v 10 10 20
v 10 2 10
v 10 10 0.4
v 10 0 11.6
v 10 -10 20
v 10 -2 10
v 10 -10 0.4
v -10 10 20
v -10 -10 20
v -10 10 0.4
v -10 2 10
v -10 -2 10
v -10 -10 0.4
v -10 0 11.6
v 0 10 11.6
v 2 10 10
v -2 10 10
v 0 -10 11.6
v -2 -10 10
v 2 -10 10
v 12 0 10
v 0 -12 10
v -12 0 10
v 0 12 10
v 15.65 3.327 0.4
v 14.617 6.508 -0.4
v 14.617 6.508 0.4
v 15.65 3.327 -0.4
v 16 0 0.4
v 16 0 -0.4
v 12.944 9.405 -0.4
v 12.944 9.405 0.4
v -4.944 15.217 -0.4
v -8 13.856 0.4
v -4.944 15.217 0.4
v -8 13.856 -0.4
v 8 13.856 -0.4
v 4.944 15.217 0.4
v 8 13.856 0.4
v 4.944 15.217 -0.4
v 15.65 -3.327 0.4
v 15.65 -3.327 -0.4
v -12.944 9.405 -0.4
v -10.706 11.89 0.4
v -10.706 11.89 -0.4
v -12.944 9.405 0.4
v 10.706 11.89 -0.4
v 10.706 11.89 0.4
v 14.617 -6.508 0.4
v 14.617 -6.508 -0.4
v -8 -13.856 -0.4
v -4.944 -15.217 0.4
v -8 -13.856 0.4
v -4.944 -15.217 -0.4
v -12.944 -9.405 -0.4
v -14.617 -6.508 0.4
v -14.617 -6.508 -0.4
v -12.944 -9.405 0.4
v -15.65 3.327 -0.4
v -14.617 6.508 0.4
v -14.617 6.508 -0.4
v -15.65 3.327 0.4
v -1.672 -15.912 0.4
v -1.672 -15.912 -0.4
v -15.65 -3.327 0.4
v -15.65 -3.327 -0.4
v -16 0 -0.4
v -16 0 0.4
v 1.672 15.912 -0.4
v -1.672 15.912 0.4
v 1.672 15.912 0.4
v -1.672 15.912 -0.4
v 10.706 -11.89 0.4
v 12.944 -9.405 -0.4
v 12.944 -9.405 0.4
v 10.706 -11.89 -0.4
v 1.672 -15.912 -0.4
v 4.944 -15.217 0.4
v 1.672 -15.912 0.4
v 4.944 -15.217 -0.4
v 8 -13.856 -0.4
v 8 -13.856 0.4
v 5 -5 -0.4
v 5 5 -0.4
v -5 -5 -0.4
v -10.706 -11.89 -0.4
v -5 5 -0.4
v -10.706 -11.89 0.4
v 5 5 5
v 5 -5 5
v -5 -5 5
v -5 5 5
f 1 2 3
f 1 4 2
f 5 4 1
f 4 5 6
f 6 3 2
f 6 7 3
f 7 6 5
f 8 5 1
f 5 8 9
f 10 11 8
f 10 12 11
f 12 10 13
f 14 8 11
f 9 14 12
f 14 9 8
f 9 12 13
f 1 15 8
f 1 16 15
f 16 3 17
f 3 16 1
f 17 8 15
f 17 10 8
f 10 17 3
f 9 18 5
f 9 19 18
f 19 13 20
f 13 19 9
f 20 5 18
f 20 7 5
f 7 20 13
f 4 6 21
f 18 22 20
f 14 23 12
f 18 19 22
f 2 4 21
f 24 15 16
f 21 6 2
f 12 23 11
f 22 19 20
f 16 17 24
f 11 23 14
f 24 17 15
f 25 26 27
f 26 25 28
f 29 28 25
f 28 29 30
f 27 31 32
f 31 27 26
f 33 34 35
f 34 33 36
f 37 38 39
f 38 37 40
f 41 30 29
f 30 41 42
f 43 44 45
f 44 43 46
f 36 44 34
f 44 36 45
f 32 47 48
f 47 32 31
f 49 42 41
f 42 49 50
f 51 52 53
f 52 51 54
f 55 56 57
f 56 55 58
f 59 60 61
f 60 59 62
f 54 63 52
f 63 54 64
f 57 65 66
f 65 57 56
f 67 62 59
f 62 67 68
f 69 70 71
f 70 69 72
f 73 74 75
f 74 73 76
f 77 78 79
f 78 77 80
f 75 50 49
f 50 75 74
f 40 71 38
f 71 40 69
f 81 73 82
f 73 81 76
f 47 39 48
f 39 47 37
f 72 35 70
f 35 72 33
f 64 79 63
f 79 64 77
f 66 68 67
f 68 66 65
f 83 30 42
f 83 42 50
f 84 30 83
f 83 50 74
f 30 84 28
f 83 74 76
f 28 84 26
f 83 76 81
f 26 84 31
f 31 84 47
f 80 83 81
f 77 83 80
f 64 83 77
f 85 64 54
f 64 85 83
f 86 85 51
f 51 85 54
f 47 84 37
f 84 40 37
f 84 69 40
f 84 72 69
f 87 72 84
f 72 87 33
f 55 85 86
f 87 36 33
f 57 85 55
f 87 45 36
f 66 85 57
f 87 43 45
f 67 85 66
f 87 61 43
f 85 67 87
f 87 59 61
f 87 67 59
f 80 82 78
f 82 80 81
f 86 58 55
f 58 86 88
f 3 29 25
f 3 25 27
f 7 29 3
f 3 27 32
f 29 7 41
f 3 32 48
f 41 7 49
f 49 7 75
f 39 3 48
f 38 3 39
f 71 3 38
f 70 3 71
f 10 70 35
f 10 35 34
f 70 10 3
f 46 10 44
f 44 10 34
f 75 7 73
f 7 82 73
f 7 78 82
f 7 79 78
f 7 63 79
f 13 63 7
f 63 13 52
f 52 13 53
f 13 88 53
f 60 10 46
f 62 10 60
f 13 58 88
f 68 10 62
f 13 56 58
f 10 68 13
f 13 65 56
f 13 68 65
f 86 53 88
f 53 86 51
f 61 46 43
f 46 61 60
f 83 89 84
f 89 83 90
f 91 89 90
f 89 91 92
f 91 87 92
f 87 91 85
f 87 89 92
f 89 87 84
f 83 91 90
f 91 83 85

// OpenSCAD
p = 4;
test(5);
echo(p);

p = 6;
test(8);
echo(p);

module test(q)
{
    p = 2 + q;
    echo(p);

    p = 4 + q;
    echo(p);
}

outer = 20;
inner=10;
s=1.2*outer/2;
lip = 0.8*outer;

difference() {
	union() {
		translate(v = [0, 0, outer/2]) {
			union() {
				cube(size = outer, center = true);
				polyhedron(
					points=[ [s,0,0],[0,-s,0],[-s,0,0],[0,s,0], 
								[0,0,0.8*s]  ],                                 
					triangles=[ [0,1,4],[1,2,4],[2,3,4],[3,0,4],          
									[1,0,3],[2,1,3] ]                         
				);
			}
		}
		cylinder(h = .04*outer, r1 = lip, r2 = lip, center = true);
	}
	cube(size = inner, center = true);
}
